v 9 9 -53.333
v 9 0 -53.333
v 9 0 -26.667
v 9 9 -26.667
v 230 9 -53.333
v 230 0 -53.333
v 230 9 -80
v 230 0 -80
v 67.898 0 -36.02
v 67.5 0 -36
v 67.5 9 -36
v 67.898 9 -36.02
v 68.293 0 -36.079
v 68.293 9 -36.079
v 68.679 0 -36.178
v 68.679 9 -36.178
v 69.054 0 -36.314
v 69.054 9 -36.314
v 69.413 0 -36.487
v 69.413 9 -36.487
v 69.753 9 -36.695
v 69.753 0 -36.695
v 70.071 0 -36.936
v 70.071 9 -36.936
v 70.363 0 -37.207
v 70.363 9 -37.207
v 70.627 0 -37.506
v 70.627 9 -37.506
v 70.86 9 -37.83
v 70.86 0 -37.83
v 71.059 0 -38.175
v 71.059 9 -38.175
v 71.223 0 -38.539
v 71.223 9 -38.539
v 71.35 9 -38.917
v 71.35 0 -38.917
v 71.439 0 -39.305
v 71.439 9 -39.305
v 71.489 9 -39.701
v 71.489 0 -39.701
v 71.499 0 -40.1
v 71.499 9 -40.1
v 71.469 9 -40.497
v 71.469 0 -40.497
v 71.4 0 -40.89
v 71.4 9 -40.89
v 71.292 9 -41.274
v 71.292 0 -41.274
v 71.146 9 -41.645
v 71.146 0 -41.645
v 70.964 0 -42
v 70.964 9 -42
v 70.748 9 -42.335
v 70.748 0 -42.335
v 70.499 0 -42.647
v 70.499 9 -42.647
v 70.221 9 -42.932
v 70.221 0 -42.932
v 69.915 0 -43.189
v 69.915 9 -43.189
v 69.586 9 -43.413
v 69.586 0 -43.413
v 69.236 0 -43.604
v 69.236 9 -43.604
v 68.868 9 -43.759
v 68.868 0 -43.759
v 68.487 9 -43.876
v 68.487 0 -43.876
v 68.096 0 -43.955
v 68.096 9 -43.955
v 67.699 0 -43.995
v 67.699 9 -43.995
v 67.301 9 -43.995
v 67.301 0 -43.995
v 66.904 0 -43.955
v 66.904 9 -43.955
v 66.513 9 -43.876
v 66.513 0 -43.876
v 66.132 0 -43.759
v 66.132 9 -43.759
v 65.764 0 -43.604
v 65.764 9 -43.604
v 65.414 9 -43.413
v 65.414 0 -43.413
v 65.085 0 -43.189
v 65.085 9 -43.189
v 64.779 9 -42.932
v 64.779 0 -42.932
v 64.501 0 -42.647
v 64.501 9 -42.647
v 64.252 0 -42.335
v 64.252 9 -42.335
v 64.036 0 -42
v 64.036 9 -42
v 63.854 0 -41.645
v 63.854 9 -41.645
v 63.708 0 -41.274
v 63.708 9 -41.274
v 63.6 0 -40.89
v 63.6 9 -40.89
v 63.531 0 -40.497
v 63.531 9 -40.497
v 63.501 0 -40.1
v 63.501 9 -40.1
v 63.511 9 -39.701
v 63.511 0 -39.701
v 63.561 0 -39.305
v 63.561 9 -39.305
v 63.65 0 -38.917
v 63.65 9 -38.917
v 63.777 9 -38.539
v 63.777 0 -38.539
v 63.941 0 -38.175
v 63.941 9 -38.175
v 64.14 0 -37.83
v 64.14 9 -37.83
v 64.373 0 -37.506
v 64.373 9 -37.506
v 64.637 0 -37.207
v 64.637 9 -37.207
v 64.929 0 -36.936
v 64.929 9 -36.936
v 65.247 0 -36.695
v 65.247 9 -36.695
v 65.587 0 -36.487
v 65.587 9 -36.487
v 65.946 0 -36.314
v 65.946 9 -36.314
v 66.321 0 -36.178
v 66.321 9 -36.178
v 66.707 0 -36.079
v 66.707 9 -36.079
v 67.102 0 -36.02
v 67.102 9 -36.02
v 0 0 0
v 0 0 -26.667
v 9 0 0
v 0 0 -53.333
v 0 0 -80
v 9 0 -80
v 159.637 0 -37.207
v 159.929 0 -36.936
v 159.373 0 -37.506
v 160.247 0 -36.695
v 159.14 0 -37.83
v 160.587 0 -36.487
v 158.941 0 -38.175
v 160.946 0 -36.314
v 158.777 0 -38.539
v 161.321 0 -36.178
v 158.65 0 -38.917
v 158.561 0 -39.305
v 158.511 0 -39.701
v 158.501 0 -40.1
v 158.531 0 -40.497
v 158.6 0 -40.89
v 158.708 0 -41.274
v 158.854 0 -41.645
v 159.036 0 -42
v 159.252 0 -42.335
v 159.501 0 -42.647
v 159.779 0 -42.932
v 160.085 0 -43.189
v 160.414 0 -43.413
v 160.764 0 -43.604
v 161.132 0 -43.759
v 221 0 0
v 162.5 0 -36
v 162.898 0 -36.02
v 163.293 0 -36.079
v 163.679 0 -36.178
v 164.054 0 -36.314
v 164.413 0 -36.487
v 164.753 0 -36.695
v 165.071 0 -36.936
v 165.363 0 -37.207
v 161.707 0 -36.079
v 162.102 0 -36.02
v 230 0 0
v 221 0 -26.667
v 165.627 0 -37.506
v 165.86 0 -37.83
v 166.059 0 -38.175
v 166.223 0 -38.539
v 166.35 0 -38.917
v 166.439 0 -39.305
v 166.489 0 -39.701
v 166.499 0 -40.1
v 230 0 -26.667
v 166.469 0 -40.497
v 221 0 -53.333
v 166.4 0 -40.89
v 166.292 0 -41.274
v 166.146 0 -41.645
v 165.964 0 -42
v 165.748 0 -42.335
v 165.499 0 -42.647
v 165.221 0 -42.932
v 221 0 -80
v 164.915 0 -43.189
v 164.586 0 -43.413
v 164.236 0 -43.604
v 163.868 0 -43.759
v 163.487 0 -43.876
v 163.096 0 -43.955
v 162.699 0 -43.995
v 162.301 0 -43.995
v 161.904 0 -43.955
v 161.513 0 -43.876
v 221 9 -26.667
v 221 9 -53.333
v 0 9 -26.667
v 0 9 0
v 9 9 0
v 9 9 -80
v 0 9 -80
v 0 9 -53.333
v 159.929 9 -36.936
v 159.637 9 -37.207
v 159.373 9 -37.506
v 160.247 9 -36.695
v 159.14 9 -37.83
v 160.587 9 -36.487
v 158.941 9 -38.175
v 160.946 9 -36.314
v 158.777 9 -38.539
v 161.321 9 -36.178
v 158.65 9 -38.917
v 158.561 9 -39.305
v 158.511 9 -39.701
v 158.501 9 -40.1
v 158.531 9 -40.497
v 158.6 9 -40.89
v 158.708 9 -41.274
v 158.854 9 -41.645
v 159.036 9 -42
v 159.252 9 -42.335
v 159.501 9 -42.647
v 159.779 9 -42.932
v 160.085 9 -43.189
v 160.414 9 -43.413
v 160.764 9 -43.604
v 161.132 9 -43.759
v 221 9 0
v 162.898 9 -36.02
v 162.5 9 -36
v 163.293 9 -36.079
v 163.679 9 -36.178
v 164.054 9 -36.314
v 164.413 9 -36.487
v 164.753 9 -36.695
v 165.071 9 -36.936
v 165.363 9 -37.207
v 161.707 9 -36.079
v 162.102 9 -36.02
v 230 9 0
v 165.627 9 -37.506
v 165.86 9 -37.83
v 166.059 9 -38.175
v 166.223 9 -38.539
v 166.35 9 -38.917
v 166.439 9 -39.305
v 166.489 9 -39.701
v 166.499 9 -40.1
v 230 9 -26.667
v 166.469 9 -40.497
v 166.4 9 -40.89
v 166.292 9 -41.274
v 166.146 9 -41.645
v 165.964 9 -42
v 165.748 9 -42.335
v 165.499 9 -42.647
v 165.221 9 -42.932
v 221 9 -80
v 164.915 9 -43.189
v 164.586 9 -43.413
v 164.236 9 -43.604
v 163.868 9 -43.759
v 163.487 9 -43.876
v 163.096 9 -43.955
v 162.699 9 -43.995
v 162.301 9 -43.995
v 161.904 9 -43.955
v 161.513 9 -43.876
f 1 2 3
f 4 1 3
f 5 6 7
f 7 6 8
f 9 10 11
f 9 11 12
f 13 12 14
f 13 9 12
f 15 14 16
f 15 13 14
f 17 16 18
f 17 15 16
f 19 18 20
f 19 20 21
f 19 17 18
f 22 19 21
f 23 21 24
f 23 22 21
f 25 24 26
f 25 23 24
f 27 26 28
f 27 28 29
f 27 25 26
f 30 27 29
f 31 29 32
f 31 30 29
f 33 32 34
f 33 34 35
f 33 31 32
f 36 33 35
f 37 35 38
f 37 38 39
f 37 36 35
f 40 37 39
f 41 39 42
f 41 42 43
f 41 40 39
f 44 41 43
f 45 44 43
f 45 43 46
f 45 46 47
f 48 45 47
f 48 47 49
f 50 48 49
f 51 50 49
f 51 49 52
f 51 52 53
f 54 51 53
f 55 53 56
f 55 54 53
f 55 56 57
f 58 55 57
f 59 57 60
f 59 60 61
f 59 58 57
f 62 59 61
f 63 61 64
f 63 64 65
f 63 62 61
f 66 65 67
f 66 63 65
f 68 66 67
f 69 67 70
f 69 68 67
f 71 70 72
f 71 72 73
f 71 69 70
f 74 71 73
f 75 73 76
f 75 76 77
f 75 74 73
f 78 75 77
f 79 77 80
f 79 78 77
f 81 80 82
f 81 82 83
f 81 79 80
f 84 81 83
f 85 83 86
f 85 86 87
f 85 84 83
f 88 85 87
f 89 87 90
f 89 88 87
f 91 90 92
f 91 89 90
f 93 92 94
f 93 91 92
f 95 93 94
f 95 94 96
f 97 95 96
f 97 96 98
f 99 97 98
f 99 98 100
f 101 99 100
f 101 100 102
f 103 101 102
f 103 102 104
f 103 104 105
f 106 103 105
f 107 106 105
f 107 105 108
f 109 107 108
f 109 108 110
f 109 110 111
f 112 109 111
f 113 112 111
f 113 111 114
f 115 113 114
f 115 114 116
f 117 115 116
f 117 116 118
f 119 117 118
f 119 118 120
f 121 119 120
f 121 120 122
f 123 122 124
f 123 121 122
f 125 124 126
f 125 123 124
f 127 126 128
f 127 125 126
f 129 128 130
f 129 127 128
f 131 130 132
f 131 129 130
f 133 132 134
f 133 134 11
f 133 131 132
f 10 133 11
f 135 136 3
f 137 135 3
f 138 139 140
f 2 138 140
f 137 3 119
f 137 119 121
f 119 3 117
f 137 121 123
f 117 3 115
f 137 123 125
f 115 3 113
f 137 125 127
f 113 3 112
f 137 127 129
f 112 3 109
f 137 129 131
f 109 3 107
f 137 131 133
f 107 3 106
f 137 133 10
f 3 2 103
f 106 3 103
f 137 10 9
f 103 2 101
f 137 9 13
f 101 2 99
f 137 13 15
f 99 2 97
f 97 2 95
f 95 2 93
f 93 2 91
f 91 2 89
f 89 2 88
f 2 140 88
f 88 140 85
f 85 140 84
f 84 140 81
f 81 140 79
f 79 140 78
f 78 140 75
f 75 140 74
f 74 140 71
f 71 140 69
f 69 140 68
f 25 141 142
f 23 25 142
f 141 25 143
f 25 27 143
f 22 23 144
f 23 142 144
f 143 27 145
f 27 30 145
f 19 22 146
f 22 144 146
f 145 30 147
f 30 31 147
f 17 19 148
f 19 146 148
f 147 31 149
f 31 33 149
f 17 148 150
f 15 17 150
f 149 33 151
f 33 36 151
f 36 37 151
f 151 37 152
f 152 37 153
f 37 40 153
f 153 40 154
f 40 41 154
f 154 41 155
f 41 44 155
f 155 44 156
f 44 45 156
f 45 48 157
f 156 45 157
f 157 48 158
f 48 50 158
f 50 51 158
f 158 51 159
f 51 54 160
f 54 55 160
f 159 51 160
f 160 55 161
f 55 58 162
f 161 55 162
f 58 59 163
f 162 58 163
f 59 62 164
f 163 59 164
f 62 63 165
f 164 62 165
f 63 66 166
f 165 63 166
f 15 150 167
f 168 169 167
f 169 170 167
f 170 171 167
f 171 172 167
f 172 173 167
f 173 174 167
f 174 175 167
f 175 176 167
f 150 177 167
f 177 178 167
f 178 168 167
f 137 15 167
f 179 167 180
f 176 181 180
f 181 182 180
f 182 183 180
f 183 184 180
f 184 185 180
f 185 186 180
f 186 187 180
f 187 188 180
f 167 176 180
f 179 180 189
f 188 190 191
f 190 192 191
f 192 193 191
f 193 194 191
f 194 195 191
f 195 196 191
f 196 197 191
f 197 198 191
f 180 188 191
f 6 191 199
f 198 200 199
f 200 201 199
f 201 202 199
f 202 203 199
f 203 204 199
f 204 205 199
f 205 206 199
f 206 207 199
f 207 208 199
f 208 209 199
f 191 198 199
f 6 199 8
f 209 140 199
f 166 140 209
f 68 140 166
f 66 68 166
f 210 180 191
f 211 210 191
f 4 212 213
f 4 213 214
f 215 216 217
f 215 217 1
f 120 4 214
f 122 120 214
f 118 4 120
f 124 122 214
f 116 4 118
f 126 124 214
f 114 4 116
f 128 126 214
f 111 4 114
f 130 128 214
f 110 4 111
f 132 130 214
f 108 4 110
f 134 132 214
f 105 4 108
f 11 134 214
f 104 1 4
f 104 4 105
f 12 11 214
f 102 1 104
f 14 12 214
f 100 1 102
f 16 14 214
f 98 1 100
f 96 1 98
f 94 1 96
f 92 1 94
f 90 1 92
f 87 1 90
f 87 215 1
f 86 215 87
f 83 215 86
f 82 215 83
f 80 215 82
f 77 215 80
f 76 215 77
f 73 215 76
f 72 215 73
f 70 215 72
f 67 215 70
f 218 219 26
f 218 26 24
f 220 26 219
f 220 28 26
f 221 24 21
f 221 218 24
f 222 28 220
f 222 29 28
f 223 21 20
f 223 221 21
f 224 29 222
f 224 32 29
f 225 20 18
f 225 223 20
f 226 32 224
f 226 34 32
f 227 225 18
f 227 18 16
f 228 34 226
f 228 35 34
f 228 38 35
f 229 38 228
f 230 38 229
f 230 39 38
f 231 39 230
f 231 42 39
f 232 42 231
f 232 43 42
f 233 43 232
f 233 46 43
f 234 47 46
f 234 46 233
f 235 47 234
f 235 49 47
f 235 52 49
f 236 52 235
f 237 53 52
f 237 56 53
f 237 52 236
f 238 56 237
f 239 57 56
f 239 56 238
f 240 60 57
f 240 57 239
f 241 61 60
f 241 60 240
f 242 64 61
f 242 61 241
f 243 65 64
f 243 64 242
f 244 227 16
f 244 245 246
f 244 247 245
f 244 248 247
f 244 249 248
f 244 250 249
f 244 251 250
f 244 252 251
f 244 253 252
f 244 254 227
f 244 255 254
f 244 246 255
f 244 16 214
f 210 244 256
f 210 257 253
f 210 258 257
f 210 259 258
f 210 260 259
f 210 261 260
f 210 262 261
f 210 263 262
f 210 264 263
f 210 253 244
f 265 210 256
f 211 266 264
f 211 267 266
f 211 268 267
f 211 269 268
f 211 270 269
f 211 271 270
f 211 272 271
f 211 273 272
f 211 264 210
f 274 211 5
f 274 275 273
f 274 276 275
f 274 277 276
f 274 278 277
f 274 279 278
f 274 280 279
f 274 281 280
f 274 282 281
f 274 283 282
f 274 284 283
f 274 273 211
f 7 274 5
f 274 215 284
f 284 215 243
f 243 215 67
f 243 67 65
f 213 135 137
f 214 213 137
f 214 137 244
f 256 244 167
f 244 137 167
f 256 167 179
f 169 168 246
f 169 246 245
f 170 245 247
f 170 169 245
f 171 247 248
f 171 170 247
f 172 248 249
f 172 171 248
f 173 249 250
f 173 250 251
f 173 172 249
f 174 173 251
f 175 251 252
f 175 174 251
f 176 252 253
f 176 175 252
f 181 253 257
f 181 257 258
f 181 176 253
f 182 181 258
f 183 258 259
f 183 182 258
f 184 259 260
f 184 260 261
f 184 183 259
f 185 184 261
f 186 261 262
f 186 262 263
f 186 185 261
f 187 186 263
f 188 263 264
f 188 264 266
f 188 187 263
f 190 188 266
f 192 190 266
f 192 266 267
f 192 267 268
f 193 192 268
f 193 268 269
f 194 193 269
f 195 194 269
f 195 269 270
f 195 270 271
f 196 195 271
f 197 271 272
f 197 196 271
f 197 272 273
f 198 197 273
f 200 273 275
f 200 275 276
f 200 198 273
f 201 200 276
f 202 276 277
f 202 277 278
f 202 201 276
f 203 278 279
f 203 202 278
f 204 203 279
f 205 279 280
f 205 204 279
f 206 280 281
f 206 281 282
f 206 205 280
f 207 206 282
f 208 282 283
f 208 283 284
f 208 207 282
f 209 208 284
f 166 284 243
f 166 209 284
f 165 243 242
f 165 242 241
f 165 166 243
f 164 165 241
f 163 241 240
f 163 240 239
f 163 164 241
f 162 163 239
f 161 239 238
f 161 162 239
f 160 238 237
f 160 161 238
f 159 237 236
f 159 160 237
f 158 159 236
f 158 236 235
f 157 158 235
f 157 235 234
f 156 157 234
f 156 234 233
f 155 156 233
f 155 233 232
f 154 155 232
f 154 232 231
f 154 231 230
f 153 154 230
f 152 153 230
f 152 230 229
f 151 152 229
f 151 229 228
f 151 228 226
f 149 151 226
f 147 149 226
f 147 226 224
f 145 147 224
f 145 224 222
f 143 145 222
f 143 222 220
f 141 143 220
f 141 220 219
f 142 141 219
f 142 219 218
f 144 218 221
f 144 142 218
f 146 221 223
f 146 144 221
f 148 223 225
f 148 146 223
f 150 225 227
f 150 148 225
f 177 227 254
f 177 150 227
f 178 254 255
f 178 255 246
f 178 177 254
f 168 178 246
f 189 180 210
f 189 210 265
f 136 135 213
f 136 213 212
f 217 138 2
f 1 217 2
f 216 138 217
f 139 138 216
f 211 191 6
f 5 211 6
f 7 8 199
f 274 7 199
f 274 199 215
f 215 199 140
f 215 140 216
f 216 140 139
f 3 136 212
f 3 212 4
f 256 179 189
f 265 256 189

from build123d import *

# Parameters (mm, degrees)
SKETCH1_R           = 4
SKETCH1_W           = 9
SKETCH1_H           = 26.666666667
BOSS_EXTRUDE1_DEPTH = 9


with BuildPart() as part:
    # Sketch1 → Boss-Extrude1 (new body)
    # profile 1 of 5: a face of its own
    with BuildSketch(Plane(origin=(0, 0, 0), x_dir=(1, 0, 0), z_dir=(0, 1, 0))):
        Polygon((9, 26.666666667), (9, 0), (221, 0), (221, 26.666666667), (221, 53.333333333), (221, 80), (9, 80), (9, 53.333333333), align=None)
        with Locations(Location((67.5, 40, 0), (0, 0, 270))):
            Circle(SKETCH1_R, mode=Mode.SUBTRACT)
        with Locations(Location((162.5, 40, 0), (0, 0, 270))):
            Circle(SKETCH1_R, mode=Mode.SUBTRACT)
    # profile 2 of 5: a face of its own
    with BuildSketch(Plane(origin=(0, 0, 0), x_dir=(1, 0, 0), z_dir=(0, 1, 0))):
        with Locations((4.5, 66.666666667)):
            Rectangle(SKETCH1_W, SKETCH1_H)
    # profile 3 of 5: a face of its own
    with BuildSketch(Plane(origin=(0, 0, 0), x_dir=(1, 0, 0), z_dir=(0, 1, 0))):
        with Locations((4.5, 13.333333334)):
            Rectangle(SKETCH1_W, SKETCH1_H)
    # profile 4 of 5: a face of its own
    with BuildSketch(Plane(origin=(0, 0, 0), x_dir=(1, 0, 0), z_dir=(0, 1, 0))):
        with Locations((225.5, 66.666666667)):
            Rectangle(SKETCH1_W, SKETCH1_H)
    # profile 5 of 5: a face of its own
    with BuildSketch(Plane(origin=(0, 0, 0), x_dir=(1, 0, 0), z_dir=(0, 1, 0))):
        with Locations((225.5, 13.333333334)):
            Rectangle(SKETCH1_W, SKETCH1_H)
    extrude(amount=BOSS_EXTRUDE1_DEPTH)


solid = part.part
